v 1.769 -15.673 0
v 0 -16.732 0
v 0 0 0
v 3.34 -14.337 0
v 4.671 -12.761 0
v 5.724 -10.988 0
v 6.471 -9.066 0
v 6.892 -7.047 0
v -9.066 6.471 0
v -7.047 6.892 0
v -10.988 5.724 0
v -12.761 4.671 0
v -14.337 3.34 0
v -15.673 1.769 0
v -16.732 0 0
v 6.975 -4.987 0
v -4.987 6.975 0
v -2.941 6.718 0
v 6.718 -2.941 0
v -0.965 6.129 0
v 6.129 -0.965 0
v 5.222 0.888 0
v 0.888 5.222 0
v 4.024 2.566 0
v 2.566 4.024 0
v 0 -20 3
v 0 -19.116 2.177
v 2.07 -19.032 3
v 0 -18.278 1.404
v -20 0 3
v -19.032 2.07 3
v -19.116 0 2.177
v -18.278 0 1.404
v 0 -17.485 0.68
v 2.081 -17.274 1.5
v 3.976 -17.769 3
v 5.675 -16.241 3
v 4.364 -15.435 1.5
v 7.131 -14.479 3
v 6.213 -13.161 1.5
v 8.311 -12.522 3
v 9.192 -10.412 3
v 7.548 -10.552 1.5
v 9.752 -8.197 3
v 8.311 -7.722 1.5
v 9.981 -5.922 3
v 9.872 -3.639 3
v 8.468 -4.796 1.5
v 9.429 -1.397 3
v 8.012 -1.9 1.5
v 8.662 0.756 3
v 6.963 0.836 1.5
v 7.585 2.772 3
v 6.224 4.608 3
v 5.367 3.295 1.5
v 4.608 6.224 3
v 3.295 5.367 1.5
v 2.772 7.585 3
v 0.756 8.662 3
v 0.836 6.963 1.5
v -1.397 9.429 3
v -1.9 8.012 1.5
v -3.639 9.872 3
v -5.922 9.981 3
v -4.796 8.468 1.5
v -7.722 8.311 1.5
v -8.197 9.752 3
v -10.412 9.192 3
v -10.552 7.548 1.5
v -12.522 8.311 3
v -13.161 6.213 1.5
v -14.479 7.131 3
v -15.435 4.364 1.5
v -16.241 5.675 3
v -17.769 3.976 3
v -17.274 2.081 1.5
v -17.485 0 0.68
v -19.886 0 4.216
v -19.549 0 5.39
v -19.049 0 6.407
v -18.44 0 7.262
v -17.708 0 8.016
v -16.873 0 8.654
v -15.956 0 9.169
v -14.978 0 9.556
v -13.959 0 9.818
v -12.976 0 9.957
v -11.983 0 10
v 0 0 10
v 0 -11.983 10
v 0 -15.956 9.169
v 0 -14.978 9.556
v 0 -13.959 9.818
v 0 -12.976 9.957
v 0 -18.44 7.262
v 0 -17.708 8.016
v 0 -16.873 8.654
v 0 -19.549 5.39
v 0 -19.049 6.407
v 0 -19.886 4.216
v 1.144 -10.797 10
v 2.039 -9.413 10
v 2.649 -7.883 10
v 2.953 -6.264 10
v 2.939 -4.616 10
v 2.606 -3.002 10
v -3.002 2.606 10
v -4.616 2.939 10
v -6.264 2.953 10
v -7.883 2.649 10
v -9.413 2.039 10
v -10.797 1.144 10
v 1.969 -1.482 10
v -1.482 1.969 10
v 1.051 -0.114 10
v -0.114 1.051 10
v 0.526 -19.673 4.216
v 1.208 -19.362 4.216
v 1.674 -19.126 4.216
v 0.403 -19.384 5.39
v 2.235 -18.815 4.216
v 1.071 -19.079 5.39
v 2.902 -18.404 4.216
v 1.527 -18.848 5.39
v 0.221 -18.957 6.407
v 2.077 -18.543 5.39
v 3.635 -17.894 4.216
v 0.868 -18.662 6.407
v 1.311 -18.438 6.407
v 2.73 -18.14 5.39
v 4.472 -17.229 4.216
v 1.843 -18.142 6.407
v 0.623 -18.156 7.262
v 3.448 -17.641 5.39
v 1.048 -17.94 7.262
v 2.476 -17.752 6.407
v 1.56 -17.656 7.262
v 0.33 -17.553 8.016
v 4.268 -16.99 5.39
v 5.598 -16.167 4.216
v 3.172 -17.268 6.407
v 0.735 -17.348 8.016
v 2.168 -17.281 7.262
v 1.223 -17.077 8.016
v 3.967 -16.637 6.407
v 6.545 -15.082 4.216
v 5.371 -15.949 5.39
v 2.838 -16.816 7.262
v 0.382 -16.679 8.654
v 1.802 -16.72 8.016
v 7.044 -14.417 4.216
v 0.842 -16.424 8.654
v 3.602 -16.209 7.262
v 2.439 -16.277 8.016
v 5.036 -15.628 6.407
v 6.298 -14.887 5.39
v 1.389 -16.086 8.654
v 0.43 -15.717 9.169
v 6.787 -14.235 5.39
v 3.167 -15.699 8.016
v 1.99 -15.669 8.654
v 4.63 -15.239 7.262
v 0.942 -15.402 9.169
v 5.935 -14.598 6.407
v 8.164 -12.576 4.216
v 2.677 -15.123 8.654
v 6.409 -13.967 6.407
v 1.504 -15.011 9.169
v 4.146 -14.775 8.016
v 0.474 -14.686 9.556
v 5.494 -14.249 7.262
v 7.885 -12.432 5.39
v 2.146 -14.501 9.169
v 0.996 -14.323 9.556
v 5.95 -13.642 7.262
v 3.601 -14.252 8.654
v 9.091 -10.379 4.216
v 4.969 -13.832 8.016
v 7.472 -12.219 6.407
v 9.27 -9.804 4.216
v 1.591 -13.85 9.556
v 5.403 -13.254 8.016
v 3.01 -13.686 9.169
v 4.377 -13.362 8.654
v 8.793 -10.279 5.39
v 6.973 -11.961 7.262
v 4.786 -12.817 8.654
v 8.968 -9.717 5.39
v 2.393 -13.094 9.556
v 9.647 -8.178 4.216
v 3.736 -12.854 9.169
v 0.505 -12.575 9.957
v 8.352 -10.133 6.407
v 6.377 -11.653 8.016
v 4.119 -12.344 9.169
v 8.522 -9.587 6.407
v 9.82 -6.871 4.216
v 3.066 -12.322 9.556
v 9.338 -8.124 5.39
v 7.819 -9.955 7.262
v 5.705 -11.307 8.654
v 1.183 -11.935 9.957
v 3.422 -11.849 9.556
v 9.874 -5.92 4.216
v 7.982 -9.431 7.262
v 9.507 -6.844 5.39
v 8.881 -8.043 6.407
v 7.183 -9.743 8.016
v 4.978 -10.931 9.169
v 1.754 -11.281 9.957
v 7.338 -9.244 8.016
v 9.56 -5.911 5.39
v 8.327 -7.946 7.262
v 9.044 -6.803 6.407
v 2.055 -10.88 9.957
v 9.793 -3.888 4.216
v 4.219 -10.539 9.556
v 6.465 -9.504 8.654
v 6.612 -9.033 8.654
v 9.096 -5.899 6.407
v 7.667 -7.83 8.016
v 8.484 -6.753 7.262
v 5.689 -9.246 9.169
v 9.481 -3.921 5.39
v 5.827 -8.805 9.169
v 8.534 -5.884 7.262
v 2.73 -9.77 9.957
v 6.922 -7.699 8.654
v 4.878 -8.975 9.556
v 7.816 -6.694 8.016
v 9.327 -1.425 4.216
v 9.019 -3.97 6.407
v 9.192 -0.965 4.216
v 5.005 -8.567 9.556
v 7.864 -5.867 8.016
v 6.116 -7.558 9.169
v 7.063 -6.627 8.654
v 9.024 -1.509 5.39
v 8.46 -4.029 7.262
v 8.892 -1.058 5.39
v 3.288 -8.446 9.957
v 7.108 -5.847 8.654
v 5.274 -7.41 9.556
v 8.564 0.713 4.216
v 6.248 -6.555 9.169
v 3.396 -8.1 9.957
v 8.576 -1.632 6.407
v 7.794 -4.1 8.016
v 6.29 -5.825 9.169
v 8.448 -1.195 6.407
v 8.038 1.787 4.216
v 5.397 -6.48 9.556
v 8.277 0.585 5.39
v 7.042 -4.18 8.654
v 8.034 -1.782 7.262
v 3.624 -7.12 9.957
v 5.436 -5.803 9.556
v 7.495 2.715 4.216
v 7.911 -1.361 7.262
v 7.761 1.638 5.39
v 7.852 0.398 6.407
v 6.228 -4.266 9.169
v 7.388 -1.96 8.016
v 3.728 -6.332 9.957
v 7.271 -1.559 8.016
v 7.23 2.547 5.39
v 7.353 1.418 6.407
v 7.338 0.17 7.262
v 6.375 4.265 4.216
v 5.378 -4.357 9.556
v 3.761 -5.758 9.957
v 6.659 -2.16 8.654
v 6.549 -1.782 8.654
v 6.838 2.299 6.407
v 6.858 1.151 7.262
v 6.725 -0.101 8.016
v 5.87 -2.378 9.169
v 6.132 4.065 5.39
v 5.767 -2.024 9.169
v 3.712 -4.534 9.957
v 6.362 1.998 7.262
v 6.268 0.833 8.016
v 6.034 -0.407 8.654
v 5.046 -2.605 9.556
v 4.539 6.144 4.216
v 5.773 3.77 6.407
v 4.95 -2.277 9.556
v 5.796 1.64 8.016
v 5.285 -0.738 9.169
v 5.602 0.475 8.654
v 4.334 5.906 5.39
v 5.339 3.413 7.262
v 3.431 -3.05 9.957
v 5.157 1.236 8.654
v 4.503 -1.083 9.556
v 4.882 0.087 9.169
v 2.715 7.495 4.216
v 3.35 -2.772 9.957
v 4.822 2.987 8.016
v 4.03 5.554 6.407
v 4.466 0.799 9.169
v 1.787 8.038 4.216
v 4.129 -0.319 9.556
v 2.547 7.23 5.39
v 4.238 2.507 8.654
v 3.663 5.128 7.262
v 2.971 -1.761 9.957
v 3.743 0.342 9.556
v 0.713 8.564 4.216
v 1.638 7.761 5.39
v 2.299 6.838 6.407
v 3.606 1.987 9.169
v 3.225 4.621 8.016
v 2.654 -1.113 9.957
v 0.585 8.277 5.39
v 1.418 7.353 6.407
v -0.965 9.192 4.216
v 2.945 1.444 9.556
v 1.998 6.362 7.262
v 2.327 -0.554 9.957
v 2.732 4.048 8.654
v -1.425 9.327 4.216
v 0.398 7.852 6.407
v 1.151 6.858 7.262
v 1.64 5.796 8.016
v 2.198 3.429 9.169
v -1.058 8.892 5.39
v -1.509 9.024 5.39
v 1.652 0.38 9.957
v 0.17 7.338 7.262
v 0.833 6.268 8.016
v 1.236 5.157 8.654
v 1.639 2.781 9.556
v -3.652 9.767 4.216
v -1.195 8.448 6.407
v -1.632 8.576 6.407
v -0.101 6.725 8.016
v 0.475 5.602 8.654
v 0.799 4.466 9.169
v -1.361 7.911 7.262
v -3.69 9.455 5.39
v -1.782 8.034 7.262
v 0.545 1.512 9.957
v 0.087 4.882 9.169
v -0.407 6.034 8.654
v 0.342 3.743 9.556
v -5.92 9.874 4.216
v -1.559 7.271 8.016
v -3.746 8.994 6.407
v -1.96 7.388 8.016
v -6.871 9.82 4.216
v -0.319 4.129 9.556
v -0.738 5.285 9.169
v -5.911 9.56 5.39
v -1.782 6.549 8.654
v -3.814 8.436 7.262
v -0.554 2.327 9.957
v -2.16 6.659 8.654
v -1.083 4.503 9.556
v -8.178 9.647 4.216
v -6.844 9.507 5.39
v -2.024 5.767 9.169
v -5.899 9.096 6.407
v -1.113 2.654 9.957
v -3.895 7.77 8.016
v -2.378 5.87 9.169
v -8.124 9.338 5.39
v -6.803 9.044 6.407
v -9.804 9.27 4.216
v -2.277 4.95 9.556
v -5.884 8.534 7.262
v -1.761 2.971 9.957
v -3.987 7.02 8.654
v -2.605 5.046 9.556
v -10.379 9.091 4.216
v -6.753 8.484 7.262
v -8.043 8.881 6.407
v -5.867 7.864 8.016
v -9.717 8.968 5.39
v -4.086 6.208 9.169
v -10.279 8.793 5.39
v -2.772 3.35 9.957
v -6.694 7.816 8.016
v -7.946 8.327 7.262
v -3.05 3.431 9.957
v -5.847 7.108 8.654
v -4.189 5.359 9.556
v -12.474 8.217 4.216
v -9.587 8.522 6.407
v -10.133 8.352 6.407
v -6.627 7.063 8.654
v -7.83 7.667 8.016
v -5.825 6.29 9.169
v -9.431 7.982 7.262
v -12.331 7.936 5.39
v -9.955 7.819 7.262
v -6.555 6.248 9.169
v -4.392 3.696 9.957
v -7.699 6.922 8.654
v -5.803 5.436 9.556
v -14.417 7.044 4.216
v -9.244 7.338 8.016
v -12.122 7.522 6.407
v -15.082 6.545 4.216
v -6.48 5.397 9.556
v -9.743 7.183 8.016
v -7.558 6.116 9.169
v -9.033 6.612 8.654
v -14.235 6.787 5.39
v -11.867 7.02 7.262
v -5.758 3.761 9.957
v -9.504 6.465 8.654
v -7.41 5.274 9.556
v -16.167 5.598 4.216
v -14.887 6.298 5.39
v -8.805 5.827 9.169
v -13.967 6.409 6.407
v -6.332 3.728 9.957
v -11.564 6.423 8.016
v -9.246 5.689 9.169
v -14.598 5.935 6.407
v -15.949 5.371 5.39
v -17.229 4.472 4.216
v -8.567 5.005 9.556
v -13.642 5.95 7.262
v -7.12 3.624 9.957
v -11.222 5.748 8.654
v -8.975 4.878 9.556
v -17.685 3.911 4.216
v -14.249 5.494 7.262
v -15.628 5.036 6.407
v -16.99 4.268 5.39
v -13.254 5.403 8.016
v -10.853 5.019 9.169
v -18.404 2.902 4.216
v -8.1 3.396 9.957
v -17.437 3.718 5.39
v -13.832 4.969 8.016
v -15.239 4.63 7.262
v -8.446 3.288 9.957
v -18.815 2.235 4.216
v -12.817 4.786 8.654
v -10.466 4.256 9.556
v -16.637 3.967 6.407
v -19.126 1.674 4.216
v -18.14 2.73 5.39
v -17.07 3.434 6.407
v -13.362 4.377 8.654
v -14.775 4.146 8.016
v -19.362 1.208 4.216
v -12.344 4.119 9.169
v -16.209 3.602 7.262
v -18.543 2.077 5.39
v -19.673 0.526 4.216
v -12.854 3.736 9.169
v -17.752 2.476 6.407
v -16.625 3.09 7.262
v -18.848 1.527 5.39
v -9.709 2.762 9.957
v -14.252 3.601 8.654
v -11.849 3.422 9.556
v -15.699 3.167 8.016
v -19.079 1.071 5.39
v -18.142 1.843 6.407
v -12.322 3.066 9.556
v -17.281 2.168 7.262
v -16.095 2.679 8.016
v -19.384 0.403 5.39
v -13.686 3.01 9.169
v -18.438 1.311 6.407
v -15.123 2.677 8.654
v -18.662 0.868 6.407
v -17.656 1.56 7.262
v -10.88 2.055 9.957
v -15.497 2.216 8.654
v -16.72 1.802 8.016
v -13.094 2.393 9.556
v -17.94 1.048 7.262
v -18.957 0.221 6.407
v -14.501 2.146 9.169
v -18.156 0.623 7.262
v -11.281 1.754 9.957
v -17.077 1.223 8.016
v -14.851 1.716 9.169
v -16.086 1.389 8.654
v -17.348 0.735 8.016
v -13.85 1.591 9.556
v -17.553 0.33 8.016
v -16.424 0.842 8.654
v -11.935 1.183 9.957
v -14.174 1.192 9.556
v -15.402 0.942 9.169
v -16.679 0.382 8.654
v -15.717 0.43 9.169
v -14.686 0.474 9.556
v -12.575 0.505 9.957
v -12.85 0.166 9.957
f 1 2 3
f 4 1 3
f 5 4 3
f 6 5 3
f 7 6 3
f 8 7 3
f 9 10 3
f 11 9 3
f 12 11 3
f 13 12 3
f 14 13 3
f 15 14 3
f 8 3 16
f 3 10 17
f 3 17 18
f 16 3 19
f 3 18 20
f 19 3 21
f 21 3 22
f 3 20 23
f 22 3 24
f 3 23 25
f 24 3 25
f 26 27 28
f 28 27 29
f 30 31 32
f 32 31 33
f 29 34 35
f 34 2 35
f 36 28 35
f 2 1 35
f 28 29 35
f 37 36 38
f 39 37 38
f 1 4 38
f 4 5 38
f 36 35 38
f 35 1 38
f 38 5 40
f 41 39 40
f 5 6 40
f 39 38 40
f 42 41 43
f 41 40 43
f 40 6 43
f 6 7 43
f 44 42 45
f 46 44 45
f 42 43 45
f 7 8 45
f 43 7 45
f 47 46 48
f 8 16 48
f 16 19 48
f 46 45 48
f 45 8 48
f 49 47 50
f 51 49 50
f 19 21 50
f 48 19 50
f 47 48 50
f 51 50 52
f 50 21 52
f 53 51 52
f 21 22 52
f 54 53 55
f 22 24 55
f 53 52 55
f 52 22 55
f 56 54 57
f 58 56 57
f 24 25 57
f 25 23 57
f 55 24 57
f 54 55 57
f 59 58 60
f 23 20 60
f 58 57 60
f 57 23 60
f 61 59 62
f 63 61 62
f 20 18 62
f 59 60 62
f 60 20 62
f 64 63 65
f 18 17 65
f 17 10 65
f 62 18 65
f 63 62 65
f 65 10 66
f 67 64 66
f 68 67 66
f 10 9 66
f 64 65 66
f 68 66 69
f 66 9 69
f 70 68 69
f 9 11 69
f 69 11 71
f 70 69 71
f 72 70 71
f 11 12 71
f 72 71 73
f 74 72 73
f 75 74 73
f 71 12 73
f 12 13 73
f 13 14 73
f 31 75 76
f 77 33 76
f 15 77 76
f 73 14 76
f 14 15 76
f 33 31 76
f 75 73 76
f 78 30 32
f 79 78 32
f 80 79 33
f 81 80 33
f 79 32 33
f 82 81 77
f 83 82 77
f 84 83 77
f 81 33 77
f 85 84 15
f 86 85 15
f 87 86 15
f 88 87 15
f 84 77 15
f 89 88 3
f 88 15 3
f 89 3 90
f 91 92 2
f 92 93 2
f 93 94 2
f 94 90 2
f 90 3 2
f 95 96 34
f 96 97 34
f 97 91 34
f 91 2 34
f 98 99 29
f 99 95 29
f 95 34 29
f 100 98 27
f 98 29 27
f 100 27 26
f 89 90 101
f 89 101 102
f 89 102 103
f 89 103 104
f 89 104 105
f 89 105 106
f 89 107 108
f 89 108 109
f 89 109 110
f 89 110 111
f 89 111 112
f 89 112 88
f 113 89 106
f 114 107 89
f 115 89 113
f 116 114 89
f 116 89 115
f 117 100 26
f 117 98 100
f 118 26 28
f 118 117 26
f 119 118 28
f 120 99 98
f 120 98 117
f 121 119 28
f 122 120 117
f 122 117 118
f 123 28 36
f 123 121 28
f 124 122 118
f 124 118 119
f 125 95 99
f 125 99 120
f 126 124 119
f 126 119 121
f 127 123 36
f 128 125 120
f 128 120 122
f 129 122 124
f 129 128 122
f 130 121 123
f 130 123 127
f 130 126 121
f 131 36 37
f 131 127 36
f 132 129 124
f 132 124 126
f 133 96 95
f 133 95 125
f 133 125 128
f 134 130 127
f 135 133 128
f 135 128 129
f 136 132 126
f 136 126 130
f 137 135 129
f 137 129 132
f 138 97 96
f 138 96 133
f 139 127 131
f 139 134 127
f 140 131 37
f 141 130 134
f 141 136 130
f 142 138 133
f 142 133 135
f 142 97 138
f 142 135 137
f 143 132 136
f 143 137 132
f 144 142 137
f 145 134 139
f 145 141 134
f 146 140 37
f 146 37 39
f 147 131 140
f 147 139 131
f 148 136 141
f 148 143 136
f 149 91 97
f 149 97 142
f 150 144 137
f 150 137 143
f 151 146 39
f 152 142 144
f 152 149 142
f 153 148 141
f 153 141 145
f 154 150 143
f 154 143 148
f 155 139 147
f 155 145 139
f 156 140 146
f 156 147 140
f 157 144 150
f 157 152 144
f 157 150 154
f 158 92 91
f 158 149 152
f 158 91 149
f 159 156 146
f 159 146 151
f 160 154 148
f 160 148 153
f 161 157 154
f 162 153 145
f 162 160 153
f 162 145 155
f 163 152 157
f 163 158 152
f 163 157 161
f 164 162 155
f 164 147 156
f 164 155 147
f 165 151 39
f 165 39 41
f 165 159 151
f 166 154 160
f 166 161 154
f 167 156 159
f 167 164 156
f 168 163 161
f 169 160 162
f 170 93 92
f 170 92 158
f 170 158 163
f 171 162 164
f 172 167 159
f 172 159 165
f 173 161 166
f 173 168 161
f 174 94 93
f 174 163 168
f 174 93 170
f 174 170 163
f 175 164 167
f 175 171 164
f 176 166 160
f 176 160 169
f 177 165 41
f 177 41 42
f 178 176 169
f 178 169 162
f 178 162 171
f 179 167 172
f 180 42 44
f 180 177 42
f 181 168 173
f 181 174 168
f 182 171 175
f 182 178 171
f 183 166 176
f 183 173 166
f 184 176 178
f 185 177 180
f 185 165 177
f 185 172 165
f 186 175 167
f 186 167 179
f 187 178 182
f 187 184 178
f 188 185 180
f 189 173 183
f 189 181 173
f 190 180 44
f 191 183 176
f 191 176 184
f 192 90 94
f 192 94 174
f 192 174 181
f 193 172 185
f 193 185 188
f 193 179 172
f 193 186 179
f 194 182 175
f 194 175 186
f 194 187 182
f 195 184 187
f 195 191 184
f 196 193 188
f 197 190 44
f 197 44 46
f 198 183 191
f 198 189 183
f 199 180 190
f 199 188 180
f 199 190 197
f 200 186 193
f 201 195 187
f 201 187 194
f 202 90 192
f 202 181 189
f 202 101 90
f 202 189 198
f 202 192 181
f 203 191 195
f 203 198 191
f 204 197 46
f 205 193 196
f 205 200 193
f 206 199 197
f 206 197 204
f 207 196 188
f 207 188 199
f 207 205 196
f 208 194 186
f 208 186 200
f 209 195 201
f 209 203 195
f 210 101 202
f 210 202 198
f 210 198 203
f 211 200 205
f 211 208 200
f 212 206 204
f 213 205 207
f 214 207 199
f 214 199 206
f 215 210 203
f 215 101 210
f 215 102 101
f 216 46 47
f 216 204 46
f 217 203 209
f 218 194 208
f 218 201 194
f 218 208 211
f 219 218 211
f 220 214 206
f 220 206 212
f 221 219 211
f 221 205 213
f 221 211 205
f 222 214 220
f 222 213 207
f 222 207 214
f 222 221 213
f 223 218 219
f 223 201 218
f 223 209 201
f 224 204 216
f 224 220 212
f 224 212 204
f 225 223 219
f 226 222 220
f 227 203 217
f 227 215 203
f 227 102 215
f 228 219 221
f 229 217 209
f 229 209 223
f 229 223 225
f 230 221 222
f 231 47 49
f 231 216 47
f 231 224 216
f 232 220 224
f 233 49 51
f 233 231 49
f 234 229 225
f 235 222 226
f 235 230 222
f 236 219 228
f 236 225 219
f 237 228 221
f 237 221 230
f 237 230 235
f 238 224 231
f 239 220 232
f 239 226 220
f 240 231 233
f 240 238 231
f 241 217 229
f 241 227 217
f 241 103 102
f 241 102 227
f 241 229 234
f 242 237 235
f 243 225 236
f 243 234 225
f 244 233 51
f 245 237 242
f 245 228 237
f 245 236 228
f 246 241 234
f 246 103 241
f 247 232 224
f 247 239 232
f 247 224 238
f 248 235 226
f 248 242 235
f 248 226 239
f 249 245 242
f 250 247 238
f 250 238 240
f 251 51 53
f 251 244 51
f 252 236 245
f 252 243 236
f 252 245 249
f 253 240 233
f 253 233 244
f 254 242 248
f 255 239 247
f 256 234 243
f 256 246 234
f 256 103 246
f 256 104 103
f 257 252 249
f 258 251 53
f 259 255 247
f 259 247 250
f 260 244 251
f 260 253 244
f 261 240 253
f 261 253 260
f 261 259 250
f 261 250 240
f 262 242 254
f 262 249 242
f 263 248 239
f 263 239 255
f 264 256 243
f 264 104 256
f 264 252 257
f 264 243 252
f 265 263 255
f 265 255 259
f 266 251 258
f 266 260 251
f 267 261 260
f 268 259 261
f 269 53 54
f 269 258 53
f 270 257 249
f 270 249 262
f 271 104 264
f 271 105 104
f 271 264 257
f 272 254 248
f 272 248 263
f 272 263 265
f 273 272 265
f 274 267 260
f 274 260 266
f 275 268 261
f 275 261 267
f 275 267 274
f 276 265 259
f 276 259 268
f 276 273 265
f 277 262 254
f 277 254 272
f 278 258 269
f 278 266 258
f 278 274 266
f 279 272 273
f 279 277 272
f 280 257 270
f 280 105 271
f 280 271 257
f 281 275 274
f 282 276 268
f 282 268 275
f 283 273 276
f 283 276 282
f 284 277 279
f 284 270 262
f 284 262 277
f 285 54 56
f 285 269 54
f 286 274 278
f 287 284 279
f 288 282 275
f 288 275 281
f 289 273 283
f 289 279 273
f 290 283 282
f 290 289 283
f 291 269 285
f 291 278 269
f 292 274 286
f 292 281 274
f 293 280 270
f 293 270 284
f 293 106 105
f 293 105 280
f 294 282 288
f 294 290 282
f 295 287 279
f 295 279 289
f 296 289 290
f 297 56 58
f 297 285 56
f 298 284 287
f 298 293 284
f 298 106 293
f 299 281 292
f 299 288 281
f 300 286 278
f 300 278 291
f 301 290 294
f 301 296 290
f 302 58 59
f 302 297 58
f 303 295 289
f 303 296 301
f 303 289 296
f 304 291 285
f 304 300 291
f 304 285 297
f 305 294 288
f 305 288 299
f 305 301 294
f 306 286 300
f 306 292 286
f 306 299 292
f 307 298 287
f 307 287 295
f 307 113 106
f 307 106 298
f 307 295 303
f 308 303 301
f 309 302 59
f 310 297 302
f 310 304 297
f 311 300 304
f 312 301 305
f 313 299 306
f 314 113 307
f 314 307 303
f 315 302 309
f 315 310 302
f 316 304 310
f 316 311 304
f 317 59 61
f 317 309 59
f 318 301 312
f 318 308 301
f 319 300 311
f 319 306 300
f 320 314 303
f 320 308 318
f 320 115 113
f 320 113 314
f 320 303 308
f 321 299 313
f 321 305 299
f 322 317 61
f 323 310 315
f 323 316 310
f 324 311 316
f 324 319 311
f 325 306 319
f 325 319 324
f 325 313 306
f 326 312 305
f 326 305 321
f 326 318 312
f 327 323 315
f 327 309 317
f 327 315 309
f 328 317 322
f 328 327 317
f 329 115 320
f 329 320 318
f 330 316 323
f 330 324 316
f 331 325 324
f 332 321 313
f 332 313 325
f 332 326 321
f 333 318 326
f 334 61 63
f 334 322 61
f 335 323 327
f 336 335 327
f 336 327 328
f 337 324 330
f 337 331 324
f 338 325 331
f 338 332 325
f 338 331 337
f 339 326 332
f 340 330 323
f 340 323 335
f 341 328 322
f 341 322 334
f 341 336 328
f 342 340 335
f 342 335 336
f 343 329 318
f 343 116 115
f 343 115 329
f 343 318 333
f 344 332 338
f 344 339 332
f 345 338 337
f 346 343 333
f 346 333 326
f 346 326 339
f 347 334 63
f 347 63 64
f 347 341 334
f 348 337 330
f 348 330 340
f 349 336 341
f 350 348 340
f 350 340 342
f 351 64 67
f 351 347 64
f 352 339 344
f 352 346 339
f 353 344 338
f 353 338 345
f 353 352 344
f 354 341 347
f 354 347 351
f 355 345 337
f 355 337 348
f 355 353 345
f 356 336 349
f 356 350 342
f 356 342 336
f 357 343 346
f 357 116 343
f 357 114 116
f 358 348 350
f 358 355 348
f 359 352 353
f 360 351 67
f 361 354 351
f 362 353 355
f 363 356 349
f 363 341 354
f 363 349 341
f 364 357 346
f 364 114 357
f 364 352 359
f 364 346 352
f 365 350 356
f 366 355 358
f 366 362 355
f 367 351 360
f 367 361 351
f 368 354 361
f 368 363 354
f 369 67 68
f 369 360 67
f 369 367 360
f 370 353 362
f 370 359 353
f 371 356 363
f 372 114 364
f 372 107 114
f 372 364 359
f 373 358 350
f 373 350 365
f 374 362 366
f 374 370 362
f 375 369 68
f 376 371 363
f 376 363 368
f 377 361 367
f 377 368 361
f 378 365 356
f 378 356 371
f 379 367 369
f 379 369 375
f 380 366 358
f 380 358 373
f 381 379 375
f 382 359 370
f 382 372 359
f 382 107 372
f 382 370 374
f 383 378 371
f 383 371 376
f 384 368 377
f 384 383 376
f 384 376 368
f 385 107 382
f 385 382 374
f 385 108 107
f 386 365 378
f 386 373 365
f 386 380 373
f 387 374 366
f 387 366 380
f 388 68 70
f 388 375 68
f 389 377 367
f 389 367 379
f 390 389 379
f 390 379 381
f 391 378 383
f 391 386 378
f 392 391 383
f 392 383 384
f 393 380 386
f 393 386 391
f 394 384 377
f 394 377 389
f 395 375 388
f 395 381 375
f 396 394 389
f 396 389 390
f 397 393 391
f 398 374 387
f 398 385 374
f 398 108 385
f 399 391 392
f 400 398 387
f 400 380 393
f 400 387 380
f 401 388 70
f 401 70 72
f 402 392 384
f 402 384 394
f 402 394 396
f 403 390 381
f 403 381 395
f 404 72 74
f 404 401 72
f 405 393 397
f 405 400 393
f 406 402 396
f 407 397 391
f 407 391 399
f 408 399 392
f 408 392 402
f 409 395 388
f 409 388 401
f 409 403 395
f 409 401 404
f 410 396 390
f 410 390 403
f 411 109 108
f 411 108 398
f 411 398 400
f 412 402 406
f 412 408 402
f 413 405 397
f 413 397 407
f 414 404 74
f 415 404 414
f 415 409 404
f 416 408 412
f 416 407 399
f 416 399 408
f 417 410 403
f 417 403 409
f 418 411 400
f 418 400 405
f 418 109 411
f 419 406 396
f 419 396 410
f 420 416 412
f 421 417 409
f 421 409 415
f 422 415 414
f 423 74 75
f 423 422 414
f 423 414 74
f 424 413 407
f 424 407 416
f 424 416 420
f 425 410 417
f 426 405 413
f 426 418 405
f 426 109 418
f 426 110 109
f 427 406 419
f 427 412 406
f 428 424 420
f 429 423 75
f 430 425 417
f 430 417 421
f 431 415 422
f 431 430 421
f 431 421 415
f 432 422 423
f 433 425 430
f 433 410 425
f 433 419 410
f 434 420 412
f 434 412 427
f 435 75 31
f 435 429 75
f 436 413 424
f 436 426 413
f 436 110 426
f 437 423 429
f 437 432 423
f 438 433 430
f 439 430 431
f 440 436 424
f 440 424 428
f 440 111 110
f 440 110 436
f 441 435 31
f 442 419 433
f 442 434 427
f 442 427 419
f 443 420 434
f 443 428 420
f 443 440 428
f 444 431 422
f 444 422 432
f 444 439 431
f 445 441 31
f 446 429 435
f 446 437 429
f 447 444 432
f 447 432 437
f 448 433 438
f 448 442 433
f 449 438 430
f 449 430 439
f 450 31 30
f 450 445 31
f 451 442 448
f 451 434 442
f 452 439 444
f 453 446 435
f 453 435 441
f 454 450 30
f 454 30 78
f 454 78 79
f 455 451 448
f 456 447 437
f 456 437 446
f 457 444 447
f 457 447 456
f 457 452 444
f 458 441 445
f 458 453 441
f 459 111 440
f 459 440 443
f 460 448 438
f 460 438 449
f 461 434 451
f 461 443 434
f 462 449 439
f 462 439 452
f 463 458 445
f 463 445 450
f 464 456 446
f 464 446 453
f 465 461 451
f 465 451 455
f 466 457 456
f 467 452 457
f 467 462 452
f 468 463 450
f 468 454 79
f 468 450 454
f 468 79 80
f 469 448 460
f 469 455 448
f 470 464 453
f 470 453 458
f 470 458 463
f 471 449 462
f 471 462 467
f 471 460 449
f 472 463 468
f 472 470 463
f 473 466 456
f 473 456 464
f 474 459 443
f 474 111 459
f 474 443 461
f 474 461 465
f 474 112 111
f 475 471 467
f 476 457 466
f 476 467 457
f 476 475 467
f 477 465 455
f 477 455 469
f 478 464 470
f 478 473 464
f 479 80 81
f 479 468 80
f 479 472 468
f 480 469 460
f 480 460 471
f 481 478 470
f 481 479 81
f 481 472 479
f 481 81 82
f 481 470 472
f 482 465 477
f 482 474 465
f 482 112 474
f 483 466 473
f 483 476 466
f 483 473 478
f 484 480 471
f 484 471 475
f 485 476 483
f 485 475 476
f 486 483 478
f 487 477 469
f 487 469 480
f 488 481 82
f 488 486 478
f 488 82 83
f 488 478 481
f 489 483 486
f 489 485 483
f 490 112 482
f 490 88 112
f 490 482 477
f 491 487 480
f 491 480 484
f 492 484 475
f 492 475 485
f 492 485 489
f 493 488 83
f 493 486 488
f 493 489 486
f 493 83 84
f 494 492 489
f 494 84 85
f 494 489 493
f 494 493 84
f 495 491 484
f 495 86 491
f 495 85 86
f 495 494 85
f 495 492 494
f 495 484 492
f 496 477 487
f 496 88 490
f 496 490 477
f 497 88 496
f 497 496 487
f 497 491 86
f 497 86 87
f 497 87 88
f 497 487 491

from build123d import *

# Parameters (mm, degrees)
F1_DEPTH = 10
F2_R     = 7
F3_SIZE  = 2.99999


# Not quite as in the source:
# - a fillet or chamfer is up to 0.001 mm smaller than in the source, because OpenCascade refuses the exact size


with BuildPart() as f1:
    # F0 (on Top) → F1 (new body)
    with BuildSketch(Plane.XY):
        with BuildLine():
            Line((-20, 0), (0, 0))
            Line((0, 0), (0, -20))
            ThreePointArc((0, -20), (5.4462447196, 5.4462447196), (-20, 0))
        make_face()
    extrude(amount=F1_DEPTH)

    # F2
    f2_edges = [f1.edges().sort_by_distance(p)[0] for p in [
        (5.446245, 5.446245, 10),
    ]]
    fillet(f2_edges, radius=F2_R)

    # F3 (size 3 in the source; OpenCascade refuses exactly that, so slightly less here)
    f3_edges = [f1.edges().sort_by_distance(p)[0] for p in [
        (5.446245, 5.446245, 0),
    ]]
    chamfer(f3_edges, length=F3_SIZE)


solid = f1.part
